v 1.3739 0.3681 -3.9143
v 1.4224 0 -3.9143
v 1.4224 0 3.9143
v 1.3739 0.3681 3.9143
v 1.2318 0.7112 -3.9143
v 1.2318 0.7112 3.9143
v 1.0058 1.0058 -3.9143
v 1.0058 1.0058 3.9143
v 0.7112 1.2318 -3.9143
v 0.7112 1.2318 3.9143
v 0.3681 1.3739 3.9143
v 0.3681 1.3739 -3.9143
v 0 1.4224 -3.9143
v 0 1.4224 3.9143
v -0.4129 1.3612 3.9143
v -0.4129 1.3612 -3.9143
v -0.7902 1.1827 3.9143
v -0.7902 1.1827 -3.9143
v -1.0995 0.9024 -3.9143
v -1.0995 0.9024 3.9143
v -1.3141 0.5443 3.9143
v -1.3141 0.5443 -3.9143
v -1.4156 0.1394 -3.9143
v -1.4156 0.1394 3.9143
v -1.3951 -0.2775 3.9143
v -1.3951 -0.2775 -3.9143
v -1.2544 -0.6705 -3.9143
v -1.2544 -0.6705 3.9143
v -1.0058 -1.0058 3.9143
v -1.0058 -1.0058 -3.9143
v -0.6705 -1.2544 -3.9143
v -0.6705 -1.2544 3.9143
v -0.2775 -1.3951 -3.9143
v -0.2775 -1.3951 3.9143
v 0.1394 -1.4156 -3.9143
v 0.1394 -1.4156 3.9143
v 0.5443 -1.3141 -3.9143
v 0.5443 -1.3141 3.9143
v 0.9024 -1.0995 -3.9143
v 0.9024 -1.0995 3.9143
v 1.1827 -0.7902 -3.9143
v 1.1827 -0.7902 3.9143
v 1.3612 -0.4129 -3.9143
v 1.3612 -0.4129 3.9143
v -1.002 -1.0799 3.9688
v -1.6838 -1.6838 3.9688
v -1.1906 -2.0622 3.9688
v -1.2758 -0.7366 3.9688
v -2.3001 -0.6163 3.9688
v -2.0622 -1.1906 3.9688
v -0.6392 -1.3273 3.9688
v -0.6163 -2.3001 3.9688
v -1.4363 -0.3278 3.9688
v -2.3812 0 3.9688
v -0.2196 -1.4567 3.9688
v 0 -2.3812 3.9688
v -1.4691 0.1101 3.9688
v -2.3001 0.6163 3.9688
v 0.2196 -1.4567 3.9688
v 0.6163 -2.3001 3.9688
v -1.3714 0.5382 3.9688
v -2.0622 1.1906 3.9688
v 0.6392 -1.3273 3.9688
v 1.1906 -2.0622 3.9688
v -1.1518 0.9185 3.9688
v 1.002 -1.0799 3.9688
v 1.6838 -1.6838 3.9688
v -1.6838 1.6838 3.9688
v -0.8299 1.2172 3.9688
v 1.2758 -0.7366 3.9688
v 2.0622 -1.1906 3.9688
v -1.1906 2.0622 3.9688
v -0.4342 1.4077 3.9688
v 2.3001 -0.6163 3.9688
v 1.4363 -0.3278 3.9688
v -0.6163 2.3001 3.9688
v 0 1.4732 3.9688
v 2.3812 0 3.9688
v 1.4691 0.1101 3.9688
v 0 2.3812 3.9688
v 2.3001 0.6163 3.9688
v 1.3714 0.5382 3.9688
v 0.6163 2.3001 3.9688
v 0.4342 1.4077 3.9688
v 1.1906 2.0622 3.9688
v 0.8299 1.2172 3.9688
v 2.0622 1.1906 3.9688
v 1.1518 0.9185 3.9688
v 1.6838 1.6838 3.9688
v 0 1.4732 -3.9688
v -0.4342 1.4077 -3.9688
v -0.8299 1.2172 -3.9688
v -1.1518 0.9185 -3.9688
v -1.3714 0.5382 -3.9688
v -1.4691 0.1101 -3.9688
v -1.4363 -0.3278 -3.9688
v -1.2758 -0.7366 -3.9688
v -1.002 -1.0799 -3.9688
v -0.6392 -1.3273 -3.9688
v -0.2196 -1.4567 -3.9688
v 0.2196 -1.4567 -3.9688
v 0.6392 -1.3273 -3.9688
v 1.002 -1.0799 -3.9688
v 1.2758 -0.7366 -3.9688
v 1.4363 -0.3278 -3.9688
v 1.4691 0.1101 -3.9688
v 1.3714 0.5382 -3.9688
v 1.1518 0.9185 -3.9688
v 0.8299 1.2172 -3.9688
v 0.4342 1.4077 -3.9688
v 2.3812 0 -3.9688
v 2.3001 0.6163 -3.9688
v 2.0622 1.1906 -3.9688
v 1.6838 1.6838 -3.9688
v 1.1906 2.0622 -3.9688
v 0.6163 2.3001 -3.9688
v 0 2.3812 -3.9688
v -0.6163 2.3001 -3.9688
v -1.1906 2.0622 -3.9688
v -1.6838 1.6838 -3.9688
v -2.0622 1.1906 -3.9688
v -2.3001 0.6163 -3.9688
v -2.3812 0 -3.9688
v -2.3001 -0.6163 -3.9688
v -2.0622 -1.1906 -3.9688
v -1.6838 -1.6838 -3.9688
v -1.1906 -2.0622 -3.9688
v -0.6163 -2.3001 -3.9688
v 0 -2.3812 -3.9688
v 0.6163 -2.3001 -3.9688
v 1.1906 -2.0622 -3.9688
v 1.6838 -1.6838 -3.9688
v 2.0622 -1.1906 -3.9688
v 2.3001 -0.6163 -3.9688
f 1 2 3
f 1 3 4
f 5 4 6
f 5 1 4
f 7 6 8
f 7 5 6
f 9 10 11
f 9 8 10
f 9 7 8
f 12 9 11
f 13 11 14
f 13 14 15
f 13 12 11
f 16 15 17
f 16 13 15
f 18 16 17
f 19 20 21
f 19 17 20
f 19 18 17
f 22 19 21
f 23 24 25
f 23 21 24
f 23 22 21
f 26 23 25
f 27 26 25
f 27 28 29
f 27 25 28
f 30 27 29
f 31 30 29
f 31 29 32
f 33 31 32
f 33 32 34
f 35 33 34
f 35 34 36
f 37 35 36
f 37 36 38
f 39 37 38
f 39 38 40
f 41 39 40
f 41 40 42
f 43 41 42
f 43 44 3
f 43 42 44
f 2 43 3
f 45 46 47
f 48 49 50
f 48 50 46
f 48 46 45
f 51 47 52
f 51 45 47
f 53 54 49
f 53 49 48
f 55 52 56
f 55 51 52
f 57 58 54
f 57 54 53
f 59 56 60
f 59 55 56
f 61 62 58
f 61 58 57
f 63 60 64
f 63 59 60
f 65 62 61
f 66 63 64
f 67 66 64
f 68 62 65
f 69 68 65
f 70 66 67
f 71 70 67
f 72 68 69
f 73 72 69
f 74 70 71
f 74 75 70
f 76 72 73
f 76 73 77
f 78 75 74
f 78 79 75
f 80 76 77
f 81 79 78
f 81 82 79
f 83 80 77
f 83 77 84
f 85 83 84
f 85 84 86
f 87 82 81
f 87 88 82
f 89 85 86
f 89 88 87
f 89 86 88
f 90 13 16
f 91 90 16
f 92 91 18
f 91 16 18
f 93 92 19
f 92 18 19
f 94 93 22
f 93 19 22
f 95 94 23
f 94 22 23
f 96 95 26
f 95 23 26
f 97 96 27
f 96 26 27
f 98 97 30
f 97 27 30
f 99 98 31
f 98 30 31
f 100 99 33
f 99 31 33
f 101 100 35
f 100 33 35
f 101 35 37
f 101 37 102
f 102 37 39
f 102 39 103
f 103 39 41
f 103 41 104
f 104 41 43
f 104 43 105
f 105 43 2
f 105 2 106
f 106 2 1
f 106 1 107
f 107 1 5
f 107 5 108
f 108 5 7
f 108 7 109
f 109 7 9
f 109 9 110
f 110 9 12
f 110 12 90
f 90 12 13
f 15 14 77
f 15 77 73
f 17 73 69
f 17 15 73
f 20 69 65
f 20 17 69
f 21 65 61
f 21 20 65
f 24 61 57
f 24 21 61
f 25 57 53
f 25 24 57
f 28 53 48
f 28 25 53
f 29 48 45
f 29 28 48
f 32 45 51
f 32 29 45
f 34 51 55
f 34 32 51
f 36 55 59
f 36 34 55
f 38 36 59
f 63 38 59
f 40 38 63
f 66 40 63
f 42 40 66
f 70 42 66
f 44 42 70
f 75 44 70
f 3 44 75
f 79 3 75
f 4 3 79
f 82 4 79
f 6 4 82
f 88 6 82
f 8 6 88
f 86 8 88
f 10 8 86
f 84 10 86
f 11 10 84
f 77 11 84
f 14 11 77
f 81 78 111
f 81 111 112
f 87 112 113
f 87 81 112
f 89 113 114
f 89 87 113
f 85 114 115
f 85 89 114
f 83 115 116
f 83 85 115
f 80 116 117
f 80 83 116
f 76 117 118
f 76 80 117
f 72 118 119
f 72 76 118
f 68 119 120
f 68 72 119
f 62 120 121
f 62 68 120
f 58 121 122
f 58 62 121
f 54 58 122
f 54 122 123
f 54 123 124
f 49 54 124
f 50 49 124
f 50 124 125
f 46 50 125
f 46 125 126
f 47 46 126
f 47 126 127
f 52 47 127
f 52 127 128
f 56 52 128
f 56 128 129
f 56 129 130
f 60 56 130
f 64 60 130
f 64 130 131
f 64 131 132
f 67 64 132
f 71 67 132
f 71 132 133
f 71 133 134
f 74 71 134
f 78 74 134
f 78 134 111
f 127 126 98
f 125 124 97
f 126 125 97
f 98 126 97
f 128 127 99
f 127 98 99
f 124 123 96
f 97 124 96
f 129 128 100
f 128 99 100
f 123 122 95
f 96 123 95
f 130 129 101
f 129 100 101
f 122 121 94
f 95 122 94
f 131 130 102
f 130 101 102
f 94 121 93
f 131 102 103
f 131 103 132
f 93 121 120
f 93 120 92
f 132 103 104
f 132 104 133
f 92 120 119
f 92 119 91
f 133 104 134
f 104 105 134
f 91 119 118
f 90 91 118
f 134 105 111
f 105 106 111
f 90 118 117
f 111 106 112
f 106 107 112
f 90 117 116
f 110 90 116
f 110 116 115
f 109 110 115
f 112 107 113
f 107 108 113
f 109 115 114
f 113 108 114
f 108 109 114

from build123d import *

# Parameters (mm, degrees)
EXTRUDE1_DEPTH      = 3.96875
EXTRUDE1_DEPTH_BACK = 3.96875
SKETCH1_R           = 3.175
SKETCH1_R_2         = 1.4224
SKETCH13_OUTSIDE_W  = 10.748
SKETCH13_OUTSIDE_H  = 10.748
SKETCH13_OUTSIDE_R  = 2.38125
CUT_EXTRUDE1_DEPTH  = 10.119493201


with BuildPart() as part:
    # Sketch1 → Extrude1 (new, two sides: drawn at the far end of the back side and taken through both)
    with BuildSketch(Plane.XY.offset(-EXTRUDE1_DEPTH_BACK)):
        Circle(SKETCH1_R)
        Circle(SKETCH1_R_2, mode=Mode.SUBTRACT)
    extrude(amount=EXTRUDE1_DEPTH + EXTRUDE1_DEPTH_BACK)

    # Extrude3 cone 1 section (through the dimple's axis) → Extrude3 (revolve, cut)
    with BuildSketch(Plane(origin=(0, 0, -3.96875), x_dir=(0, 1, 0), z_dir=(1, 0, 0))):
        Polygon((0, 0), (1.4732, 0), (0, 1.579813584), align=None)
    extrude3 = revolve(axis=Axis((0, 0, -3.96875), (0, 0, 1)), mode=Mode.SUBTRACT)

    # Mirror1: Extrude3 across plane
    add(extrude3.mirror(Plane.XY), mode=Mode.SUBTRACT)

    # Sketch13 outside → Cut-Extrude1 (cut, through all)
    with BuildSketch(Plane.XY.offset(3.96875)):
        Rectangle(SKETCH13_OUTSIDE_W, SKETCH13_OUTSIDE_H)
        Circle(SKETCH13_OUTSIDE_R, mode=Mode.SUBTRACT)
    extrude(amount=-CUT_EXTRUDE1_DEPTH, mode=Mode.SUBTRACT)


solid = part.part
